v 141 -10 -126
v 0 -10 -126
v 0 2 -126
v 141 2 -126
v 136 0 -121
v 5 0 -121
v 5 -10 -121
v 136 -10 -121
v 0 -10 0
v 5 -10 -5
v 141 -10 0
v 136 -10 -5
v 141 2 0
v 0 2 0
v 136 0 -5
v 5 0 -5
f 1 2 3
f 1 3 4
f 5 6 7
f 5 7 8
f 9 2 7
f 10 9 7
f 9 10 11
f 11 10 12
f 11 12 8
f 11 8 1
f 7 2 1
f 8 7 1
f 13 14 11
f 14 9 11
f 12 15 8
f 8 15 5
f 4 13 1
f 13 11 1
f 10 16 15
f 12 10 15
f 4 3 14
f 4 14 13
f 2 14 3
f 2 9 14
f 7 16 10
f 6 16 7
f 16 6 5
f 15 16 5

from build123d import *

# Parameters (mm, degrees)
SKETCH1_W           = 141
SKETCH1_H           = 126
SKETCH1_W_2         = 131
SKETCH1_H_2         = 116
BOSS_EXTRUDE1_DEPTH = 10
SKETCH1_2_W         = 141
SKETCH1_2_H         = 126
BOSS_EXTRUDE2_DEPTH = 2


with BuildPart() as part:
    # Sketch1 → Boss-Extrude1 (new body)
    with BuildSketch(Plane(origin=(0, 0, 0), x_dir=(1, 0, 0), z_dir=(0, 1, 0))):
        with Locations((70.5, 63)):
            Rectangle(SKETCH1_W, SKETCH1_H)
        with Locations((70.5, 63)):
            Rectangle(SKETCH1_W_2, SKETCH1_H_2, mode=Mode.SUBTRACT)
    extrude(amount=-BOSS_EXTRUDE1_DEPTH)

    # Sketch1<2> → Boss-Extrude2 (add)
    with BuildSketch(Plane(origin=(0, 0, 0), x_dir=(1, 0, 0), z_dir=(0, 1, 0))):
        with Locations((70.5, 63)):
            Rectangle(SKETCH1_2_W, SKETCH1_2_H)
    extrude(amount=BOSS_EXTRUDE2_DEPTH)


solid = part.part
